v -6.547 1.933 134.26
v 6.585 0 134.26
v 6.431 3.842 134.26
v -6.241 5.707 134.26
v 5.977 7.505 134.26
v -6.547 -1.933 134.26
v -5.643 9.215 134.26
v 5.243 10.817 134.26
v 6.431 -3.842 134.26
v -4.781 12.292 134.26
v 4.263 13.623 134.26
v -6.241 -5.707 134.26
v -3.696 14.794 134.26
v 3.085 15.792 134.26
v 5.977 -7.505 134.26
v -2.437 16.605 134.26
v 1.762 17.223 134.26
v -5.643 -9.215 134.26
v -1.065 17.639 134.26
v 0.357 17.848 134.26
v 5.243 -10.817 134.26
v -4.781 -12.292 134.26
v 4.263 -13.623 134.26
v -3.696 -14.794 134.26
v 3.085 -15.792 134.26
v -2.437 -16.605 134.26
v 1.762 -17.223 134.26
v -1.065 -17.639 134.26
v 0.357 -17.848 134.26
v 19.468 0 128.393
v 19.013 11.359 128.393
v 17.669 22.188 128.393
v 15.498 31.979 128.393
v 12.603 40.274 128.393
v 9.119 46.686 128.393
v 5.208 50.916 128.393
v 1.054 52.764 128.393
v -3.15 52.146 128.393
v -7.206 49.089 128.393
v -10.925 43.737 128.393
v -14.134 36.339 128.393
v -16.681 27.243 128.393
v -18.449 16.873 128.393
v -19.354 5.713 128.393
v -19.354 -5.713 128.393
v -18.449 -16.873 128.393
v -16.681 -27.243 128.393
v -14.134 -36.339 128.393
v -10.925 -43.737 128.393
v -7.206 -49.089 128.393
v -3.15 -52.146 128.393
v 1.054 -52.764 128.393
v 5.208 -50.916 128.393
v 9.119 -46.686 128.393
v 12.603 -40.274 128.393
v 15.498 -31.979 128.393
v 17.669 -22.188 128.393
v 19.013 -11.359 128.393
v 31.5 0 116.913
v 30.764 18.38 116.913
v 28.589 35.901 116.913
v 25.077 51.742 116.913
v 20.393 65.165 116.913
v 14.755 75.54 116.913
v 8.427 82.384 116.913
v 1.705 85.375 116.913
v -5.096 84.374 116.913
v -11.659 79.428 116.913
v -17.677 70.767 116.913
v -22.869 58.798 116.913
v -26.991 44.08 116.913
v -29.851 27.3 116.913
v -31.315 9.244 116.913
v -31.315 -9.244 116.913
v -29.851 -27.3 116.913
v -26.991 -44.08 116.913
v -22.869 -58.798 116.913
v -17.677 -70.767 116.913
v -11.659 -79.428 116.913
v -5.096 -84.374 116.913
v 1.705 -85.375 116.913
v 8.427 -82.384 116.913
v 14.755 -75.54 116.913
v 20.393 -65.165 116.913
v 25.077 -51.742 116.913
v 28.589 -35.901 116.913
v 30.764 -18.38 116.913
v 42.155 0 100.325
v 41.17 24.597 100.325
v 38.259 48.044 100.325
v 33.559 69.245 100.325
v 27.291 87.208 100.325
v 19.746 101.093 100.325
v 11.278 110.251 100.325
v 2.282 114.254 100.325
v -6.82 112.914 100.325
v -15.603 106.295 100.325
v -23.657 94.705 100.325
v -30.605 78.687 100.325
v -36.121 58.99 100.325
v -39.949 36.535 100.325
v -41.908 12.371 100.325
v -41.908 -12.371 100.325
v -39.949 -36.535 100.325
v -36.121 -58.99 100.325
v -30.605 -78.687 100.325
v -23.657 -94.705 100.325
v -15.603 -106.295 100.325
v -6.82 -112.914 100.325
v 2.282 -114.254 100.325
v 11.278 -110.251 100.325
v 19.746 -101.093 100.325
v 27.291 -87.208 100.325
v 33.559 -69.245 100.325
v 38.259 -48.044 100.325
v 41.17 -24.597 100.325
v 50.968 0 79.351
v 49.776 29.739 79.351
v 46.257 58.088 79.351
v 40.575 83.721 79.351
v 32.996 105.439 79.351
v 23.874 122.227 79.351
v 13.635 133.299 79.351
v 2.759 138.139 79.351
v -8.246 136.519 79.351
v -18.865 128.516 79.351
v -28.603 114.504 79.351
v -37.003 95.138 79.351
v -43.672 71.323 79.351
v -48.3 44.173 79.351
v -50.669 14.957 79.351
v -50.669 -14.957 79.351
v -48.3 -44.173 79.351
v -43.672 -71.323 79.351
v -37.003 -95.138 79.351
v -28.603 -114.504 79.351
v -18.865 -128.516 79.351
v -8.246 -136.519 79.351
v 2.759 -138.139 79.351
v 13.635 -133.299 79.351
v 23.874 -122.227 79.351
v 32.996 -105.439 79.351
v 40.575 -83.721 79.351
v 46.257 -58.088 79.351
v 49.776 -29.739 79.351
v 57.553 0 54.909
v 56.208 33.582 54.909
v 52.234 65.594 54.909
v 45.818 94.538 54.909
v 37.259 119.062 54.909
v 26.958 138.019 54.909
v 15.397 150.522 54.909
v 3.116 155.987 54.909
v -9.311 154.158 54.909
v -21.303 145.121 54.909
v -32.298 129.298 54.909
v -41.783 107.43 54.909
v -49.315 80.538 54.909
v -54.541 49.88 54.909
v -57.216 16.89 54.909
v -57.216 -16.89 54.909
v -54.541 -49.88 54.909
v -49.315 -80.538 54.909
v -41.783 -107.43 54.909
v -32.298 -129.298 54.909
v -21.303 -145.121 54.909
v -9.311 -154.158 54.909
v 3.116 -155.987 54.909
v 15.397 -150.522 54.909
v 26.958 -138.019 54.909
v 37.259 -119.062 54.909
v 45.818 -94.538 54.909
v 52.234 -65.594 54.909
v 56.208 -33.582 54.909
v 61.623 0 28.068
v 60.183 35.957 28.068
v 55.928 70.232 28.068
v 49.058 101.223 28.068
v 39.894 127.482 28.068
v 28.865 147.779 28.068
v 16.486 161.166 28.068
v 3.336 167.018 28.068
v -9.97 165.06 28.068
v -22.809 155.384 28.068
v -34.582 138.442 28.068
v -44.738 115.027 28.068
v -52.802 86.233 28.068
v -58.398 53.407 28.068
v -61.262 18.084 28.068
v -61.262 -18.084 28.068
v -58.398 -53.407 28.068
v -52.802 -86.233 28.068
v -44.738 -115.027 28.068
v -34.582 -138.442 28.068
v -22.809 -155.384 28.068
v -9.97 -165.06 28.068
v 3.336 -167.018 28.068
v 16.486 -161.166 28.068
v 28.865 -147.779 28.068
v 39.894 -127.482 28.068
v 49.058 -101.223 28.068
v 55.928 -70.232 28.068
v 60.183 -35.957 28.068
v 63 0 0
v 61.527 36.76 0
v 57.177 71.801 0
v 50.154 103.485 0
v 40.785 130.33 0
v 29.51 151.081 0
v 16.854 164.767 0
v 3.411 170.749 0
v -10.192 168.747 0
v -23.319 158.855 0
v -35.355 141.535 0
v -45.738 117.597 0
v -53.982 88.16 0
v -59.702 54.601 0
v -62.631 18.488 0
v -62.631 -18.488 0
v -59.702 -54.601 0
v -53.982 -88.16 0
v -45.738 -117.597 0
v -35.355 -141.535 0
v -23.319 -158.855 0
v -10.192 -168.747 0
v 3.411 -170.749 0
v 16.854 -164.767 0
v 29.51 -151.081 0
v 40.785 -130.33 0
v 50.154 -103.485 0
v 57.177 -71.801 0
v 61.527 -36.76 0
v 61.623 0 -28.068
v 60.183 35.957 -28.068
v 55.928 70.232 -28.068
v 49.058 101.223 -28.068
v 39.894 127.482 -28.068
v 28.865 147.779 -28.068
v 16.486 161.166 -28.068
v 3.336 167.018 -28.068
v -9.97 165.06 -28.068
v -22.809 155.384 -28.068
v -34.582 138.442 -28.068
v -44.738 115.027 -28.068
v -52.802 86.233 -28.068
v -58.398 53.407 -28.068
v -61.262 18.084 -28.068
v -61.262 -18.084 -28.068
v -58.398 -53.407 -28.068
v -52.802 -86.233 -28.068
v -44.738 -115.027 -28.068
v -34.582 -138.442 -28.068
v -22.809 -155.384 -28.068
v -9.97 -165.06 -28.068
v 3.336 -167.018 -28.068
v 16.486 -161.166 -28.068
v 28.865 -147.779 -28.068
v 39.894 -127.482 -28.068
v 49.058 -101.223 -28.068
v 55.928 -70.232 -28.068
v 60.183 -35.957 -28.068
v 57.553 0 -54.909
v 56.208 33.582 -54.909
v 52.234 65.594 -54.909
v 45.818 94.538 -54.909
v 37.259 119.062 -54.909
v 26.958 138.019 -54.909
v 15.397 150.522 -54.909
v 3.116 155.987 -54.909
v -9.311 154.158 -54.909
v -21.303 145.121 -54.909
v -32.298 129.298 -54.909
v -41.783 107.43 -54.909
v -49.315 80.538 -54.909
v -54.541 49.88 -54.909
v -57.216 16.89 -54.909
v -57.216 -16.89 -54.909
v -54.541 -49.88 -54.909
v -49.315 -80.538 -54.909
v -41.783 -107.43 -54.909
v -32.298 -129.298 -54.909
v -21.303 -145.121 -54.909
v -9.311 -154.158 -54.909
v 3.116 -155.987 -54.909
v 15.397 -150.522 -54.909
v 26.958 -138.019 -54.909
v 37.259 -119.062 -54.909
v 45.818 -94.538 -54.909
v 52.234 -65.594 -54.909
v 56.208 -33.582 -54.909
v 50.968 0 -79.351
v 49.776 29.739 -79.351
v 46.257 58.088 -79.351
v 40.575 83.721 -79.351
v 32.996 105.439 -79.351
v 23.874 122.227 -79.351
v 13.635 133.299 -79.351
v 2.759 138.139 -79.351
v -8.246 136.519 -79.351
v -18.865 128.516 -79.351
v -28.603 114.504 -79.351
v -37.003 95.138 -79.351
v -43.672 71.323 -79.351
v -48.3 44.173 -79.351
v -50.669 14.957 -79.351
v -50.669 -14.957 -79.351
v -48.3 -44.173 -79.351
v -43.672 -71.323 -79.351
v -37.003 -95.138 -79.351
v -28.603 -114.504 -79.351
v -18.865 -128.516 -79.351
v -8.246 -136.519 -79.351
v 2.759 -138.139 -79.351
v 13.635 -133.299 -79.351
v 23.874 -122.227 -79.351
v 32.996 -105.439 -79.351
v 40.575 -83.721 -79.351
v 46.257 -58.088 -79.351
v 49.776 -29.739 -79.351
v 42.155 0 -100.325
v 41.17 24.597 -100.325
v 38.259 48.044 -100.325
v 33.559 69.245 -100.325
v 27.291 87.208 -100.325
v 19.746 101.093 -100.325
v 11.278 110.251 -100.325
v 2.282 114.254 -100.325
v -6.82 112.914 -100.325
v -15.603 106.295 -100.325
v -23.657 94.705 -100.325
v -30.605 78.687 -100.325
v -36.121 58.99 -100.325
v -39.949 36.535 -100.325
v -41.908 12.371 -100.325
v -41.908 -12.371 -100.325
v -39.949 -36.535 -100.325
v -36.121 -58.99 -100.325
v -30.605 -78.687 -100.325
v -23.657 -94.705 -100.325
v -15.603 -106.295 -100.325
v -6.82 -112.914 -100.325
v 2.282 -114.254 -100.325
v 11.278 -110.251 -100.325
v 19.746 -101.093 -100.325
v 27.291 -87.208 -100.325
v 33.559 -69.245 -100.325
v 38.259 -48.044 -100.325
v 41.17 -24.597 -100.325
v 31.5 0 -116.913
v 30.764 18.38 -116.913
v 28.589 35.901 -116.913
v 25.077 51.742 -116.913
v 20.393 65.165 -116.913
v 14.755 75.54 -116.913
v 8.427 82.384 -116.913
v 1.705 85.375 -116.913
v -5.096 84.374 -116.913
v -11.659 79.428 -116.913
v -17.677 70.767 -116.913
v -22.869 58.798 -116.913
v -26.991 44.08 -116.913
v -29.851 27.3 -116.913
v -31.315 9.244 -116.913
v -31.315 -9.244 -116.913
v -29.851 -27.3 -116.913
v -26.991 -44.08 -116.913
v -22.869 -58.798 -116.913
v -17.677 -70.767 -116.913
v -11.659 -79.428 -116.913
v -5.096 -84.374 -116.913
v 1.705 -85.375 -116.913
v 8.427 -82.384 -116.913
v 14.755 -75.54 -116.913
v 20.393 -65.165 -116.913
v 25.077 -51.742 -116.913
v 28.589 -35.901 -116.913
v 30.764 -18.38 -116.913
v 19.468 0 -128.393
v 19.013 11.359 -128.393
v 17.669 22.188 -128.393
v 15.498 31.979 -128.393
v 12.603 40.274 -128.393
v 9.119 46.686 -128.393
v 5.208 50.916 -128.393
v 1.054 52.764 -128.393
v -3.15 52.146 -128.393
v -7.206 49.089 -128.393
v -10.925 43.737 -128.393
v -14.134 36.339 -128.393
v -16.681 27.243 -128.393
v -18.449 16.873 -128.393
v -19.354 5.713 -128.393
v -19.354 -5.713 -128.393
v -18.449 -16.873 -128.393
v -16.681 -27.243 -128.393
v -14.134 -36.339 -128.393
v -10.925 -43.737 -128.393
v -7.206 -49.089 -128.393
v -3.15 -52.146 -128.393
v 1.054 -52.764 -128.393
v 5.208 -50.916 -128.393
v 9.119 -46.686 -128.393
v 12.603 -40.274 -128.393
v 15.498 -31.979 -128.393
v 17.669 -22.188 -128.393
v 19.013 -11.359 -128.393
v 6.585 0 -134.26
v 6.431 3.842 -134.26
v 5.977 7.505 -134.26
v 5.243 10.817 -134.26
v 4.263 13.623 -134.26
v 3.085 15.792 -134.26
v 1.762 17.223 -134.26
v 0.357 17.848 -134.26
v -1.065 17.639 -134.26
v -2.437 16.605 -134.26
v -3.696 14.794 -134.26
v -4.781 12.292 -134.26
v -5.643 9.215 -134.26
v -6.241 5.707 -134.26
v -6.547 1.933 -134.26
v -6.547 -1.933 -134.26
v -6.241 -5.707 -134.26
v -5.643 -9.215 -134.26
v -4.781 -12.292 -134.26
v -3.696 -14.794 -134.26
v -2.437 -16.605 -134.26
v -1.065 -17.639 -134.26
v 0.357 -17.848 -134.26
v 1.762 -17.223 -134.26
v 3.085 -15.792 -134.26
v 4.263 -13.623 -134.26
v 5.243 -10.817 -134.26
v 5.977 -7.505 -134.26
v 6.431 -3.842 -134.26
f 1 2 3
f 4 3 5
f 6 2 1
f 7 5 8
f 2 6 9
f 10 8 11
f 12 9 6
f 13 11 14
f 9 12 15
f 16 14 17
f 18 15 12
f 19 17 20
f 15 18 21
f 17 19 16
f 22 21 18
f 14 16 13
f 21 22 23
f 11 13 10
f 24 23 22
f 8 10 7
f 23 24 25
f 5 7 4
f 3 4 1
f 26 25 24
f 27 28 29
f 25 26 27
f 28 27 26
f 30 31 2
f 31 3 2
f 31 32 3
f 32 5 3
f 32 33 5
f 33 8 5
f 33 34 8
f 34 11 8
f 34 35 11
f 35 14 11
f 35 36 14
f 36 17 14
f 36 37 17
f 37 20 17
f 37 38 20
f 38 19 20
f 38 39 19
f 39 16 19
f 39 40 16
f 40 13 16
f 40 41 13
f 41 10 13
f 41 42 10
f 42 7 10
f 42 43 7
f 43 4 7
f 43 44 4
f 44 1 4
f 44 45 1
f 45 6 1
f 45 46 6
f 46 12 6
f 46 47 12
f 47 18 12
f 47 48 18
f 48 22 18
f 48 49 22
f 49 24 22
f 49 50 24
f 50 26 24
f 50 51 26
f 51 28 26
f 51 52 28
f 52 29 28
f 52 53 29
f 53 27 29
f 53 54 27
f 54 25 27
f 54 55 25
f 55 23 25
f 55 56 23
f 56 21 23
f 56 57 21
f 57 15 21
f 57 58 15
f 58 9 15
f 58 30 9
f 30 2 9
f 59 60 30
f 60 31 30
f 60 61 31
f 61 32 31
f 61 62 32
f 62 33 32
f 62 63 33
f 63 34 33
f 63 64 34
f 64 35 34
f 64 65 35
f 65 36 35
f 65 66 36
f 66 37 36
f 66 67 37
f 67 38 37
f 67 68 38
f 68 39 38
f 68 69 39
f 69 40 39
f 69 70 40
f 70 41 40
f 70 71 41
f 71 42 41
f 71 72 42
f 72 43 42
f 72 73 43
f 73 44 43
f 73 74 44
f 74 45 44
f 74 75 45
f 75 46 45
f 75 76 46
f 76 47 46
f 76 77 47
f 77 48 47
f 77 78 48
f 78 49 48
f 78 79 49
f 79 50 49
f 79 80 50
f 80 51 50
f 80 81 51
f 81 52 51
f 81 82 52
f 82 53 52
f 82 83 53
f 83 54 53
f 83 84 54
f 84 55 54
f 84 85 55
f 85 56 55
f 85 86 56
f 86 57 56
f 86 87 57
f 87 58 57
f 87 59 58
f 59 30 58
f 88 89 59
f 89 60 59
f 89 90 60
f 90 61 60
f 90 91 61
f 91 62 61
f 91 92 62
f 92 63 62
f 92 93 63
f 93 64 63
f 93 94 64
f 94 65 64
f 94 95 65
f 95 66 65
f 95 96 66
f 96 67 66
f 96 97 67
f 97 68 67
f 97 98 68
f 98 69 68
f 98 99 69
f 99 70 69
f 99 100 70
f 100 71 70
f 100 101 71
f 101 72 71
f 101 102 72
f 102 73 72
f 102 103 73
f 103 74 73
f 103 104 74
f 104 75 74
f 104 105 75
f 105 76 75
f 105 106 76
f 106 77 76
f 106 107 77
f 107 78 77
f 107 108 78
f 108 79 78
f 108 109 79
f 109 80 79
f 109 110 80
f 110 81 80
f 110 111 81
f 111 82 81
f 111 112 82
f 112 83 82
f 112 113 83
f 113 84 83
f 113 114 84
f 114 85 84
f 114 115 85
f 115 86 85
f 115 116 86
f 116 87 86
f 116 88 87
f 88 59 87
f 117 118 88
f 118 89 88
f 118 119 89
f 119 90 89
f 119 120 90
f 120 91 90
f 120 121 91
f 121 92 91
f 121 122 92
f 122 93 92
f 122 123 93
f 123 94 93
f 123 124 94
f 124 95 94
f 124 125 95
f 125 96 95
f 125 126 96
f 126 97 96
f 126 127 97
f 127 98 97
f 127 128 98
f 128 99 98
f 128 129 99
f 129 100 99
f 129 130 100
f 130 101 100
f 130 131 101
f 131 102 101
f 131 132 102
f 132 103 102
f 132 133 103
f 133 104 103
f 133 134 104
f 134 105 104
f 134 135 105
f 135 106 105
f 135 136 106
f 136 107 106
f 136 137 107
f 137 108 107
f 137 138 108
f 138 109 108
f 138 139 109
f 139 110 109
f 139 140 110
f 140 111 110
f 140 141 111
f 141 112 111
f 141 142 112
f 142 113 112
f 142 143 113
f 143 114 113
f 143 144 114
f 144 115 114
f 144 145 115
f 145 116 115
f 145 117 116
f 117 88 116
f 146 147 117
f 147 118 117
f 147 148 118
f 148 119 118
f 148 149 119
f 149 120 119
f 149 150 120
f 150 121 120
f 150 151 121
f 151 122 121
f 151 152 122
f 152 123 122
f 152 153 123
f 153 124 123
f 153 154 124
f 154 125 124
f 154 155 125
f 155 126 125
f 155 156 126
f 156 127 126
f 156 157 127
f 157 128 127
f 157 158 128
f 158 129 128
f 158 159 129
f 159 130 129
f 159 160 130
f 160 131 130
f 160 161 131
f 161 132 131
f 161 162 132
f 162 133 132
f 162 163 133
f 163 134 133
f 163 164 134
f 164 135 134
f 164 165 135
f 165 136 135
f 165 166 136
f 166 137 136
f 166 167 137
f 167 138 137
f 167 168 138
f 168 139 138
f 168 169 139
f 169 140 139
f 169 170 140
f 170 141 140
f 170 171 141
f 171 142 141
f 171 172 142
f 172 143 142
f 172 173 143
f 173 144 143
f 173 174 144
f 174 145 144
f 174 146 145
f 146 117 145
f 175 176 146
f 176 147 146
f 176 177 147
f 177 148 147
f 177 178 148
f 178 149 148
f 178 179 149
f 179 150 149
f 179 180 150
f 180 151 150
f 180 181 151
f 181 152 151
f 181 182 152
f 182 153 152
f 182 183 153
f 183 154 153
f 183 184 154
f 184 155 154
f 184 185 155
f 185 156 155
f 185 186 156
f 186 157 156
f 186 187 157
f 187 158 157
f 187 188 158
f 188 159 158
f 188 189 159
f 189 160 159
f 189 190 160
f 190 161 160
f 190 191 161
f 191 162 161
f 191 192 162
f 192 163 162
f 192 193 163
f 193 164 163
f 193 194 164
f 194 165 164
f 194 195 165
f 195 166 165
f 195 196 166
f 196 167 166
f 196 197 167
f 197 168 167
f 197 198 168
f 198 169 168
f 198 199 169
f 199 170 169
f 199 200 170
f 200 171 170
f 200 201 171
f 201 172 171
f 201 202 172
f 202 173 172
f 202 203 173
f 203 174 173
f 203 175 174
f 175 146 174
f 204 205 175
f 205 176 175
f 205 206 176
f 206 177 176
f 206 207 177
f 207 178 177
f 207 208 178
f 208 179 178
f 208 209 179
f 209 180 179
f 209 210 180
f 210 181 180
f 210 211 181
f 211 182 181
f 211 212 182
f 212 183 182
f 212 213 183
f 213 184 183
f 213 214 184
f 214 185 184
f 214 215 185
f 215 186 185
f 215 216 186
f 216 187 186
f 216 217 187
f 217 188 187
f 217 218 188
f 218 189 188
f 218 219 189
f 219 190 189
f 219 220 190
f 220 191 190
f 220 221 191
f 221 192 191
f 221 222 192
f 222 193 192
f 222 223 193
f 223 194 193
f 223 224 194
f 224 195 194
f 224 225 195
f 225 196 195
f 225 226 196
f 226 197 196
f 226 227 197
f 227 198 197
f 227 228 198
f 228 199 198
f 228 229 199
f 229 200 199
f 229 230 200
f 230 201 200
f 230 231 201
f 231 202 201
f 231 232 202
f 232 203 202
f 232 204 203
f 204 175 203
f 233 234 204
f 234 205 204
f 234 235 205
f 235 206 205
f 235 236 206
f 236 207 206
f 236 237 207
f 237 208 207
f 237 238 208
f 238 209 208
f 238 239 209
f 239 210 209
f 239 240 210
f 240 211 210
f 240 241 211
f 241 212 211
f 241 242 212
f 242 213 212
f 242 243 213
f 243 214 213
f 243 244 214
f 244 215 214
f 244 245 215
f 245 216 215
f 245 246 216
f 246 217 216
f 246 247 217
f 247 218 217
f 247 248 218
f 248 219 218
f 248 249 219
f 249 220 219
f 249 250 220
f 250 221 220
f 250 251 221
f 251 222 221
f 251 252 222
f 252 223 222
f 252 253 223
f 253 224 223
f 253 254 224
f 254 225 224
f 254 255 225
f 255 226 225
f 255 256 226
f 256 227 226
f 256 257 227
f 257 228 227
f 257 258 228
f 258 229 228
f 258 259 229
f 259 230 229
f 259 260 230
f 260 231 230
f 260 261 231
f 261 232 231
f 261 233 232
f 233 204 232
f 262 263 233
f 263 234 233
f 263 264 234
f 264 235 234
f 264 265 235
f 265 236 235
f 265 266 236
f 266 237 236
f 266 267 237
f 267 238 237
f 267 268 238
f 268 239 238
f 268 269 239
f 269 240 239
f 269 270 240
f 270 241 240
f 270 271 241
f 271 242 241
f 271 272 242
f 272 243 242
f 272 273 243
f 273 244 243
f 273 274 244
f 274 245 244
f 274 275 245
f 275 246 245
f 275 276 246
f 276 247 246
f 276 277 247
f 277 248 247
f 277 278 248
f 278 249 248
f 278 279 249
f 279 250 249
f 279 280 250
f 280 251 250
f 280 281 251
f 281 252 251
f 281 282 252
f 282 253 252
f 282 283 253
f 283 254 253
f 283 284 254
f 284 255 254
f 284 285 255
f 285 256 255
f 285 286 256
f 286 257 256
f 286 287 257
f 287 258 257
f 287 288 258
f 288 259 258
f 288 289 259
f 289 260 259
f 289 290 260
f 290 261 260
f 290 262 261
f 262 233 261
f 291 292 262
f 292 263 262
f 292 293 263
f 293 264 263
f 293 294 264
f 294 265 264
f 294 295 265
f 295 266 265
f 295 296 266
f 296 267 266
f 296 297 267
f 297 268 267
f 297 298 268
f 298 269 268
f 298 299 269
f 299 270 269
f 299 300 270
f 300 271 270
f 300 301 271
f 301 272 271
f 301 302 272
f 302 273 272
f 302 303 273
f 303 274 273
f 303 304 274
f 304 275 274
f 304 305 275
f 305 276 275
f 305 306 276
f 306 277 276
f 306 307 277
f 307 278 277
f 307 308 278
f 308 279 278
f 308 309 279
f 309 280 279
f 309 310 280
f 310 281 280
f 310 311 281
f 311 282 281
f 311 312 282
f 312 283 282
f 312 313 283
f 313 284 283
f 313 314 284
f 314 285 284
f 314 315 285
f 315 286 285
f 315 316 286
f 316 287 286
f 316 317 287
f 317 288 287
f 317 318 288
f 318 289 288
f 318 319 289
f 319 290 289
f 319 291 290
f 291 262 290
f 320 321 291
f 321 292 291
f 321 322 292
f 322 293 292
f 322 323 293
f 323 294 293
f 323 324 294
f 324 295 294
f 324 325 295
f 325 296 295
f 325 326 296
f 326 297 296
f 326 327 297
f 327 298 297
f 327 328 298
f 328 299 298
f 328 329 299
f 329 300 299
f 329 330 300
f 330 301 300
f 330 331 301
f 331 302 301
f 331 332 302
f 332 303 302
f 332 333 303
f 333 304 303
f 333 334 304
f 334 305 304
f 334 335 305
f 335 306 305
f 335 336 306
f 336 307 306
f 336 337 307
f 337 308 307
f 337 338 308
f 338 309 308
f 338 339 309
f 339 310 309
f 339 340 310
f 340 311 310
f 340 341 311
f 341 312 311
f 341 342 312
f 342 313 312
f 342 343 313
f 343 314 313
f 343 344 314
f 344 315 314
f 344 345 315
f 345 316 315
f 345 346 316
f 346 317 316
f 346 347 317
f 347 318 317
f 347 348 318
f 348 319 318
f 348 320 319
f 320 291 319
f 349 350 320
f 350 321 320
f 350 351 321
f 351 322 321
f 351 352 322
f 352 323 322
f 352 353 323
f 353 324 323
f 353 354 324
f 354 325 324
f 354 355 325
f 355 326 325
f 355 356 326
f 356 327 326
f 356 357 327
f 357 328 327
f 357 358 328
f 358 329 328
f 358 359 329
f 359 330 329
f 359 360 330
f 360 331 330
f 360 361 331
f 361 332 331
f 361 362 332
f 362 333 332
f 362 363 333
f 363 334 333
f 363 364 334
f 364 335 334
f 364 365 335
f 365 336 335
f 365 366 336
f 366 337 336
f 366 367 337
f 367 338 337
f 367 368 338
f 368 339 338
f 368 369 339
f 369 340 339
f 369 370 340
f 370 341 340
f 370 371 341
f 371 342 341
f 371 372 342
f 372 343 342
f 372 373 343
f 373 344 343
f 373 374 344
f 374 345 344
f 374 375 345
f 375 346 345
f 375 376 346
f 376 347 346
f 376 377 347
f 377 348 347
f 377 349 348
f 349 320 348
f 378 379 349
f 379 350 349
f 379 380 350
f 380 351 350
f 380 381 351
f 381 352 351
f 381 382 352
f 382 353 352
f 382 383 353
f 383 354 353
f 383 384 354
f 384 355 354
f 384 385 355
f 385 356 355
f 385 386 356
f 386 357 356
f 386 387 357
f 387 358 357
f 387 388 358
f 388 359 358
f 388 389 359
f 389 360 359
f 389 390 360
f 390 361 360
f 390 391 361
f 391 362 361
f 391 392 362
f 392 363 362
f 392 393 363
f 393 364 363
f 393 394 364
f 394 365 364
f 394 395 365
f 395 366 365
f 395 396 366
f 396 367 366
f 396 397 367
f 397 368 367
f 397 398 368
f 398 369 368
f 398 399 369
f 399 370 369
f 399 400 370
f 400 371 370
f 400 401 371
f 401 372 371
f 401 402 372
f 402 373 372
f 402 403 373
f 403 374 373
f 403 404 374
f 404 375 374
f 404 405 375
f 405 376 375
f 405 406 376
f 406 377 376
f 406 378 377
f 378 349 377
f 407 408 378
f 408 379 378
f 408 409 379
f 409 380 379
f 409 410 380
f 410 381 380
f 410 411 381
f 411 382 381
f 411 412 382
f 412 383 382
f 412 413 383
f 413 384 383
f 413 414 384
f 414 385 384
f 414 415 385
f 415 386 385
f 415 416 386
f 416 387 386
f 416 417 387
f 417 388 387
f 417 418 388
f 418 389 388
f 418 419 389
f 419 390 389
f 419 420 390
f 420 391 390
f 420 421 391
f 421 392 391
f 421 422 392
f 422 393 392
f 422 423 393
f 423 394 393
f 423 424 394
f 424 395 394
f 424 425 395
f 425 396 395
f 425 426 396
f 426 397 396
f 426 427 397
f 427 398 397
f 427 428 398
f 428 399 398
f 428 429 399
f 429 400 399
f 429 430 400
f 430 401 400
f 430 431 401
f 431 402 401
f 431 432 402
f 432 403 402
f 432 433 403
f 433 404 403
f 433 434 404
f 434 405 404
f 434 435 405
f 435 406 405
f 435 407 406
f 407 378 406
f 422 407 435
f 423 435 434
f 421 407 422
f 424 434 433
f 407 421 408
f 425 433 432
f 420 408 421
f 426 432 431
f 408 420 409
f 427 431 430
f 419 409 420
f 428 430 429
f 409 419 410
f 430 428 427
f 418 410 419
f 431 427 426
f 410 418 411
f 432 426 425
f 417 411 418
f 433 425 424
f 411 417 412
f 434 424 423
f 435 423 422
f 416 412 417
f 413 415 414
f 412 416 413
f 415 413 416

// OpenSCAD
// Generated by SolidPython 1.0.1 on 2020-07-29 00:46:48


scale(v = [7, 19, 15]) {
	sphere(r = 9);
}
/***********************************************
*********      SolidPython code:      **********
************************************************
 
# import packages: SolidPython
from solid import *
from solid.utils import *
from itertools import chain, combinations, permutations


class Resize:

    def __init__(self, scad_file):
        self.scad_file = scad_file
        #self.scad_file = import_scad(scad_file)
        # cone/cylinder param:
        self.r1 = 0
        self.r2 = 0
        self.h = 0
        # rectangular prism param:
        self.w = 0
        self.l = 0
        # ellipse param:
        self.r = 0

    # import OpenScad code (file name corresponds to shape)


    # classify shape + parameters
    def assign(self, param1, param2, param3):
        if self.scad_file == 'cone.scad':
            self.r1 = param1
            self.r2 = param2
            self.h = param3
        elif self.scad_file == 'cylinder.scad':
            self.r1 = param1
            self.r2 = param2
            self.h = param3
        elif self.scad_file == 'rectangularPrism.scad':
            self.h = param1
            self.l = param2
            self.w = param3
        else:
            self.r = param1
            self.h = param2

    # resize parameters
    def iterate(self):
        x = range(3, 20, 2)
        i = 1
        if self.scad_file == 'cone.scad':
            tempList = list(permutations(x, 2))
            for temp in tempList:
                param1 = temp[0]
                param2 = temp[1]
                filepath = 'produced_scad_files/' + 'cone' + str(param1) + '_' + str(param2) + '_' + '.scad'
                scad_render_to_file(cylinder(h=param1, r1=param2, r2=0), filepath)

        elif self.scad_file == 'cylinder.scad':
            tempList = list(permutations(x, 3))
            for temp in tempList:
                param1 = temp[0]
                param2 = temp[1]
                filepath = 'produced_scad_files/' + 'cylinder' + str(param1) + '_' + str(param2) + '_' + '.scad'
                scad_render_to_file(cylinder(h=param1, r1=param2, r2=param2), filepath)

        elif self.scad_file == 'rectangularPrism.scad':
            tempList = list(permutations(x, 3))
            for temp in tempList:
                param1 = temp[0]
                param2 = temp[1]
                param3 = temp[2]
                filepath = 'produced_scad_files/' + 'rectangularPrism' + str(param1) + '_' + str(param2) + '_' + str(
                    param3) + '.scad'
                scad_render_to_file(cube(size=(param1, param2, param3)), filepath)

        elif self.scad_file == 'ellipse.scad':
            tempList = list(permutations(x, 4))
            for temp in tempList:
                param1 = temp[0]
                param2 = temp[1]
                param3 = temp[2]
                param4 = temp[3]
                filepath = 'produced_scad_files/' + 'ellipse' + str(param1) + '_' + str(param2) + '_' + str(param3) + '_' + str(param4) + '.scad'
                scad_render_to_file(scale([param1, param2, param3])(sphere(r=param4)), filepath)

    def render_to_scadfile(self):
        scad_render_to_file(scad, 'example.scad') 
 
************************************************/
